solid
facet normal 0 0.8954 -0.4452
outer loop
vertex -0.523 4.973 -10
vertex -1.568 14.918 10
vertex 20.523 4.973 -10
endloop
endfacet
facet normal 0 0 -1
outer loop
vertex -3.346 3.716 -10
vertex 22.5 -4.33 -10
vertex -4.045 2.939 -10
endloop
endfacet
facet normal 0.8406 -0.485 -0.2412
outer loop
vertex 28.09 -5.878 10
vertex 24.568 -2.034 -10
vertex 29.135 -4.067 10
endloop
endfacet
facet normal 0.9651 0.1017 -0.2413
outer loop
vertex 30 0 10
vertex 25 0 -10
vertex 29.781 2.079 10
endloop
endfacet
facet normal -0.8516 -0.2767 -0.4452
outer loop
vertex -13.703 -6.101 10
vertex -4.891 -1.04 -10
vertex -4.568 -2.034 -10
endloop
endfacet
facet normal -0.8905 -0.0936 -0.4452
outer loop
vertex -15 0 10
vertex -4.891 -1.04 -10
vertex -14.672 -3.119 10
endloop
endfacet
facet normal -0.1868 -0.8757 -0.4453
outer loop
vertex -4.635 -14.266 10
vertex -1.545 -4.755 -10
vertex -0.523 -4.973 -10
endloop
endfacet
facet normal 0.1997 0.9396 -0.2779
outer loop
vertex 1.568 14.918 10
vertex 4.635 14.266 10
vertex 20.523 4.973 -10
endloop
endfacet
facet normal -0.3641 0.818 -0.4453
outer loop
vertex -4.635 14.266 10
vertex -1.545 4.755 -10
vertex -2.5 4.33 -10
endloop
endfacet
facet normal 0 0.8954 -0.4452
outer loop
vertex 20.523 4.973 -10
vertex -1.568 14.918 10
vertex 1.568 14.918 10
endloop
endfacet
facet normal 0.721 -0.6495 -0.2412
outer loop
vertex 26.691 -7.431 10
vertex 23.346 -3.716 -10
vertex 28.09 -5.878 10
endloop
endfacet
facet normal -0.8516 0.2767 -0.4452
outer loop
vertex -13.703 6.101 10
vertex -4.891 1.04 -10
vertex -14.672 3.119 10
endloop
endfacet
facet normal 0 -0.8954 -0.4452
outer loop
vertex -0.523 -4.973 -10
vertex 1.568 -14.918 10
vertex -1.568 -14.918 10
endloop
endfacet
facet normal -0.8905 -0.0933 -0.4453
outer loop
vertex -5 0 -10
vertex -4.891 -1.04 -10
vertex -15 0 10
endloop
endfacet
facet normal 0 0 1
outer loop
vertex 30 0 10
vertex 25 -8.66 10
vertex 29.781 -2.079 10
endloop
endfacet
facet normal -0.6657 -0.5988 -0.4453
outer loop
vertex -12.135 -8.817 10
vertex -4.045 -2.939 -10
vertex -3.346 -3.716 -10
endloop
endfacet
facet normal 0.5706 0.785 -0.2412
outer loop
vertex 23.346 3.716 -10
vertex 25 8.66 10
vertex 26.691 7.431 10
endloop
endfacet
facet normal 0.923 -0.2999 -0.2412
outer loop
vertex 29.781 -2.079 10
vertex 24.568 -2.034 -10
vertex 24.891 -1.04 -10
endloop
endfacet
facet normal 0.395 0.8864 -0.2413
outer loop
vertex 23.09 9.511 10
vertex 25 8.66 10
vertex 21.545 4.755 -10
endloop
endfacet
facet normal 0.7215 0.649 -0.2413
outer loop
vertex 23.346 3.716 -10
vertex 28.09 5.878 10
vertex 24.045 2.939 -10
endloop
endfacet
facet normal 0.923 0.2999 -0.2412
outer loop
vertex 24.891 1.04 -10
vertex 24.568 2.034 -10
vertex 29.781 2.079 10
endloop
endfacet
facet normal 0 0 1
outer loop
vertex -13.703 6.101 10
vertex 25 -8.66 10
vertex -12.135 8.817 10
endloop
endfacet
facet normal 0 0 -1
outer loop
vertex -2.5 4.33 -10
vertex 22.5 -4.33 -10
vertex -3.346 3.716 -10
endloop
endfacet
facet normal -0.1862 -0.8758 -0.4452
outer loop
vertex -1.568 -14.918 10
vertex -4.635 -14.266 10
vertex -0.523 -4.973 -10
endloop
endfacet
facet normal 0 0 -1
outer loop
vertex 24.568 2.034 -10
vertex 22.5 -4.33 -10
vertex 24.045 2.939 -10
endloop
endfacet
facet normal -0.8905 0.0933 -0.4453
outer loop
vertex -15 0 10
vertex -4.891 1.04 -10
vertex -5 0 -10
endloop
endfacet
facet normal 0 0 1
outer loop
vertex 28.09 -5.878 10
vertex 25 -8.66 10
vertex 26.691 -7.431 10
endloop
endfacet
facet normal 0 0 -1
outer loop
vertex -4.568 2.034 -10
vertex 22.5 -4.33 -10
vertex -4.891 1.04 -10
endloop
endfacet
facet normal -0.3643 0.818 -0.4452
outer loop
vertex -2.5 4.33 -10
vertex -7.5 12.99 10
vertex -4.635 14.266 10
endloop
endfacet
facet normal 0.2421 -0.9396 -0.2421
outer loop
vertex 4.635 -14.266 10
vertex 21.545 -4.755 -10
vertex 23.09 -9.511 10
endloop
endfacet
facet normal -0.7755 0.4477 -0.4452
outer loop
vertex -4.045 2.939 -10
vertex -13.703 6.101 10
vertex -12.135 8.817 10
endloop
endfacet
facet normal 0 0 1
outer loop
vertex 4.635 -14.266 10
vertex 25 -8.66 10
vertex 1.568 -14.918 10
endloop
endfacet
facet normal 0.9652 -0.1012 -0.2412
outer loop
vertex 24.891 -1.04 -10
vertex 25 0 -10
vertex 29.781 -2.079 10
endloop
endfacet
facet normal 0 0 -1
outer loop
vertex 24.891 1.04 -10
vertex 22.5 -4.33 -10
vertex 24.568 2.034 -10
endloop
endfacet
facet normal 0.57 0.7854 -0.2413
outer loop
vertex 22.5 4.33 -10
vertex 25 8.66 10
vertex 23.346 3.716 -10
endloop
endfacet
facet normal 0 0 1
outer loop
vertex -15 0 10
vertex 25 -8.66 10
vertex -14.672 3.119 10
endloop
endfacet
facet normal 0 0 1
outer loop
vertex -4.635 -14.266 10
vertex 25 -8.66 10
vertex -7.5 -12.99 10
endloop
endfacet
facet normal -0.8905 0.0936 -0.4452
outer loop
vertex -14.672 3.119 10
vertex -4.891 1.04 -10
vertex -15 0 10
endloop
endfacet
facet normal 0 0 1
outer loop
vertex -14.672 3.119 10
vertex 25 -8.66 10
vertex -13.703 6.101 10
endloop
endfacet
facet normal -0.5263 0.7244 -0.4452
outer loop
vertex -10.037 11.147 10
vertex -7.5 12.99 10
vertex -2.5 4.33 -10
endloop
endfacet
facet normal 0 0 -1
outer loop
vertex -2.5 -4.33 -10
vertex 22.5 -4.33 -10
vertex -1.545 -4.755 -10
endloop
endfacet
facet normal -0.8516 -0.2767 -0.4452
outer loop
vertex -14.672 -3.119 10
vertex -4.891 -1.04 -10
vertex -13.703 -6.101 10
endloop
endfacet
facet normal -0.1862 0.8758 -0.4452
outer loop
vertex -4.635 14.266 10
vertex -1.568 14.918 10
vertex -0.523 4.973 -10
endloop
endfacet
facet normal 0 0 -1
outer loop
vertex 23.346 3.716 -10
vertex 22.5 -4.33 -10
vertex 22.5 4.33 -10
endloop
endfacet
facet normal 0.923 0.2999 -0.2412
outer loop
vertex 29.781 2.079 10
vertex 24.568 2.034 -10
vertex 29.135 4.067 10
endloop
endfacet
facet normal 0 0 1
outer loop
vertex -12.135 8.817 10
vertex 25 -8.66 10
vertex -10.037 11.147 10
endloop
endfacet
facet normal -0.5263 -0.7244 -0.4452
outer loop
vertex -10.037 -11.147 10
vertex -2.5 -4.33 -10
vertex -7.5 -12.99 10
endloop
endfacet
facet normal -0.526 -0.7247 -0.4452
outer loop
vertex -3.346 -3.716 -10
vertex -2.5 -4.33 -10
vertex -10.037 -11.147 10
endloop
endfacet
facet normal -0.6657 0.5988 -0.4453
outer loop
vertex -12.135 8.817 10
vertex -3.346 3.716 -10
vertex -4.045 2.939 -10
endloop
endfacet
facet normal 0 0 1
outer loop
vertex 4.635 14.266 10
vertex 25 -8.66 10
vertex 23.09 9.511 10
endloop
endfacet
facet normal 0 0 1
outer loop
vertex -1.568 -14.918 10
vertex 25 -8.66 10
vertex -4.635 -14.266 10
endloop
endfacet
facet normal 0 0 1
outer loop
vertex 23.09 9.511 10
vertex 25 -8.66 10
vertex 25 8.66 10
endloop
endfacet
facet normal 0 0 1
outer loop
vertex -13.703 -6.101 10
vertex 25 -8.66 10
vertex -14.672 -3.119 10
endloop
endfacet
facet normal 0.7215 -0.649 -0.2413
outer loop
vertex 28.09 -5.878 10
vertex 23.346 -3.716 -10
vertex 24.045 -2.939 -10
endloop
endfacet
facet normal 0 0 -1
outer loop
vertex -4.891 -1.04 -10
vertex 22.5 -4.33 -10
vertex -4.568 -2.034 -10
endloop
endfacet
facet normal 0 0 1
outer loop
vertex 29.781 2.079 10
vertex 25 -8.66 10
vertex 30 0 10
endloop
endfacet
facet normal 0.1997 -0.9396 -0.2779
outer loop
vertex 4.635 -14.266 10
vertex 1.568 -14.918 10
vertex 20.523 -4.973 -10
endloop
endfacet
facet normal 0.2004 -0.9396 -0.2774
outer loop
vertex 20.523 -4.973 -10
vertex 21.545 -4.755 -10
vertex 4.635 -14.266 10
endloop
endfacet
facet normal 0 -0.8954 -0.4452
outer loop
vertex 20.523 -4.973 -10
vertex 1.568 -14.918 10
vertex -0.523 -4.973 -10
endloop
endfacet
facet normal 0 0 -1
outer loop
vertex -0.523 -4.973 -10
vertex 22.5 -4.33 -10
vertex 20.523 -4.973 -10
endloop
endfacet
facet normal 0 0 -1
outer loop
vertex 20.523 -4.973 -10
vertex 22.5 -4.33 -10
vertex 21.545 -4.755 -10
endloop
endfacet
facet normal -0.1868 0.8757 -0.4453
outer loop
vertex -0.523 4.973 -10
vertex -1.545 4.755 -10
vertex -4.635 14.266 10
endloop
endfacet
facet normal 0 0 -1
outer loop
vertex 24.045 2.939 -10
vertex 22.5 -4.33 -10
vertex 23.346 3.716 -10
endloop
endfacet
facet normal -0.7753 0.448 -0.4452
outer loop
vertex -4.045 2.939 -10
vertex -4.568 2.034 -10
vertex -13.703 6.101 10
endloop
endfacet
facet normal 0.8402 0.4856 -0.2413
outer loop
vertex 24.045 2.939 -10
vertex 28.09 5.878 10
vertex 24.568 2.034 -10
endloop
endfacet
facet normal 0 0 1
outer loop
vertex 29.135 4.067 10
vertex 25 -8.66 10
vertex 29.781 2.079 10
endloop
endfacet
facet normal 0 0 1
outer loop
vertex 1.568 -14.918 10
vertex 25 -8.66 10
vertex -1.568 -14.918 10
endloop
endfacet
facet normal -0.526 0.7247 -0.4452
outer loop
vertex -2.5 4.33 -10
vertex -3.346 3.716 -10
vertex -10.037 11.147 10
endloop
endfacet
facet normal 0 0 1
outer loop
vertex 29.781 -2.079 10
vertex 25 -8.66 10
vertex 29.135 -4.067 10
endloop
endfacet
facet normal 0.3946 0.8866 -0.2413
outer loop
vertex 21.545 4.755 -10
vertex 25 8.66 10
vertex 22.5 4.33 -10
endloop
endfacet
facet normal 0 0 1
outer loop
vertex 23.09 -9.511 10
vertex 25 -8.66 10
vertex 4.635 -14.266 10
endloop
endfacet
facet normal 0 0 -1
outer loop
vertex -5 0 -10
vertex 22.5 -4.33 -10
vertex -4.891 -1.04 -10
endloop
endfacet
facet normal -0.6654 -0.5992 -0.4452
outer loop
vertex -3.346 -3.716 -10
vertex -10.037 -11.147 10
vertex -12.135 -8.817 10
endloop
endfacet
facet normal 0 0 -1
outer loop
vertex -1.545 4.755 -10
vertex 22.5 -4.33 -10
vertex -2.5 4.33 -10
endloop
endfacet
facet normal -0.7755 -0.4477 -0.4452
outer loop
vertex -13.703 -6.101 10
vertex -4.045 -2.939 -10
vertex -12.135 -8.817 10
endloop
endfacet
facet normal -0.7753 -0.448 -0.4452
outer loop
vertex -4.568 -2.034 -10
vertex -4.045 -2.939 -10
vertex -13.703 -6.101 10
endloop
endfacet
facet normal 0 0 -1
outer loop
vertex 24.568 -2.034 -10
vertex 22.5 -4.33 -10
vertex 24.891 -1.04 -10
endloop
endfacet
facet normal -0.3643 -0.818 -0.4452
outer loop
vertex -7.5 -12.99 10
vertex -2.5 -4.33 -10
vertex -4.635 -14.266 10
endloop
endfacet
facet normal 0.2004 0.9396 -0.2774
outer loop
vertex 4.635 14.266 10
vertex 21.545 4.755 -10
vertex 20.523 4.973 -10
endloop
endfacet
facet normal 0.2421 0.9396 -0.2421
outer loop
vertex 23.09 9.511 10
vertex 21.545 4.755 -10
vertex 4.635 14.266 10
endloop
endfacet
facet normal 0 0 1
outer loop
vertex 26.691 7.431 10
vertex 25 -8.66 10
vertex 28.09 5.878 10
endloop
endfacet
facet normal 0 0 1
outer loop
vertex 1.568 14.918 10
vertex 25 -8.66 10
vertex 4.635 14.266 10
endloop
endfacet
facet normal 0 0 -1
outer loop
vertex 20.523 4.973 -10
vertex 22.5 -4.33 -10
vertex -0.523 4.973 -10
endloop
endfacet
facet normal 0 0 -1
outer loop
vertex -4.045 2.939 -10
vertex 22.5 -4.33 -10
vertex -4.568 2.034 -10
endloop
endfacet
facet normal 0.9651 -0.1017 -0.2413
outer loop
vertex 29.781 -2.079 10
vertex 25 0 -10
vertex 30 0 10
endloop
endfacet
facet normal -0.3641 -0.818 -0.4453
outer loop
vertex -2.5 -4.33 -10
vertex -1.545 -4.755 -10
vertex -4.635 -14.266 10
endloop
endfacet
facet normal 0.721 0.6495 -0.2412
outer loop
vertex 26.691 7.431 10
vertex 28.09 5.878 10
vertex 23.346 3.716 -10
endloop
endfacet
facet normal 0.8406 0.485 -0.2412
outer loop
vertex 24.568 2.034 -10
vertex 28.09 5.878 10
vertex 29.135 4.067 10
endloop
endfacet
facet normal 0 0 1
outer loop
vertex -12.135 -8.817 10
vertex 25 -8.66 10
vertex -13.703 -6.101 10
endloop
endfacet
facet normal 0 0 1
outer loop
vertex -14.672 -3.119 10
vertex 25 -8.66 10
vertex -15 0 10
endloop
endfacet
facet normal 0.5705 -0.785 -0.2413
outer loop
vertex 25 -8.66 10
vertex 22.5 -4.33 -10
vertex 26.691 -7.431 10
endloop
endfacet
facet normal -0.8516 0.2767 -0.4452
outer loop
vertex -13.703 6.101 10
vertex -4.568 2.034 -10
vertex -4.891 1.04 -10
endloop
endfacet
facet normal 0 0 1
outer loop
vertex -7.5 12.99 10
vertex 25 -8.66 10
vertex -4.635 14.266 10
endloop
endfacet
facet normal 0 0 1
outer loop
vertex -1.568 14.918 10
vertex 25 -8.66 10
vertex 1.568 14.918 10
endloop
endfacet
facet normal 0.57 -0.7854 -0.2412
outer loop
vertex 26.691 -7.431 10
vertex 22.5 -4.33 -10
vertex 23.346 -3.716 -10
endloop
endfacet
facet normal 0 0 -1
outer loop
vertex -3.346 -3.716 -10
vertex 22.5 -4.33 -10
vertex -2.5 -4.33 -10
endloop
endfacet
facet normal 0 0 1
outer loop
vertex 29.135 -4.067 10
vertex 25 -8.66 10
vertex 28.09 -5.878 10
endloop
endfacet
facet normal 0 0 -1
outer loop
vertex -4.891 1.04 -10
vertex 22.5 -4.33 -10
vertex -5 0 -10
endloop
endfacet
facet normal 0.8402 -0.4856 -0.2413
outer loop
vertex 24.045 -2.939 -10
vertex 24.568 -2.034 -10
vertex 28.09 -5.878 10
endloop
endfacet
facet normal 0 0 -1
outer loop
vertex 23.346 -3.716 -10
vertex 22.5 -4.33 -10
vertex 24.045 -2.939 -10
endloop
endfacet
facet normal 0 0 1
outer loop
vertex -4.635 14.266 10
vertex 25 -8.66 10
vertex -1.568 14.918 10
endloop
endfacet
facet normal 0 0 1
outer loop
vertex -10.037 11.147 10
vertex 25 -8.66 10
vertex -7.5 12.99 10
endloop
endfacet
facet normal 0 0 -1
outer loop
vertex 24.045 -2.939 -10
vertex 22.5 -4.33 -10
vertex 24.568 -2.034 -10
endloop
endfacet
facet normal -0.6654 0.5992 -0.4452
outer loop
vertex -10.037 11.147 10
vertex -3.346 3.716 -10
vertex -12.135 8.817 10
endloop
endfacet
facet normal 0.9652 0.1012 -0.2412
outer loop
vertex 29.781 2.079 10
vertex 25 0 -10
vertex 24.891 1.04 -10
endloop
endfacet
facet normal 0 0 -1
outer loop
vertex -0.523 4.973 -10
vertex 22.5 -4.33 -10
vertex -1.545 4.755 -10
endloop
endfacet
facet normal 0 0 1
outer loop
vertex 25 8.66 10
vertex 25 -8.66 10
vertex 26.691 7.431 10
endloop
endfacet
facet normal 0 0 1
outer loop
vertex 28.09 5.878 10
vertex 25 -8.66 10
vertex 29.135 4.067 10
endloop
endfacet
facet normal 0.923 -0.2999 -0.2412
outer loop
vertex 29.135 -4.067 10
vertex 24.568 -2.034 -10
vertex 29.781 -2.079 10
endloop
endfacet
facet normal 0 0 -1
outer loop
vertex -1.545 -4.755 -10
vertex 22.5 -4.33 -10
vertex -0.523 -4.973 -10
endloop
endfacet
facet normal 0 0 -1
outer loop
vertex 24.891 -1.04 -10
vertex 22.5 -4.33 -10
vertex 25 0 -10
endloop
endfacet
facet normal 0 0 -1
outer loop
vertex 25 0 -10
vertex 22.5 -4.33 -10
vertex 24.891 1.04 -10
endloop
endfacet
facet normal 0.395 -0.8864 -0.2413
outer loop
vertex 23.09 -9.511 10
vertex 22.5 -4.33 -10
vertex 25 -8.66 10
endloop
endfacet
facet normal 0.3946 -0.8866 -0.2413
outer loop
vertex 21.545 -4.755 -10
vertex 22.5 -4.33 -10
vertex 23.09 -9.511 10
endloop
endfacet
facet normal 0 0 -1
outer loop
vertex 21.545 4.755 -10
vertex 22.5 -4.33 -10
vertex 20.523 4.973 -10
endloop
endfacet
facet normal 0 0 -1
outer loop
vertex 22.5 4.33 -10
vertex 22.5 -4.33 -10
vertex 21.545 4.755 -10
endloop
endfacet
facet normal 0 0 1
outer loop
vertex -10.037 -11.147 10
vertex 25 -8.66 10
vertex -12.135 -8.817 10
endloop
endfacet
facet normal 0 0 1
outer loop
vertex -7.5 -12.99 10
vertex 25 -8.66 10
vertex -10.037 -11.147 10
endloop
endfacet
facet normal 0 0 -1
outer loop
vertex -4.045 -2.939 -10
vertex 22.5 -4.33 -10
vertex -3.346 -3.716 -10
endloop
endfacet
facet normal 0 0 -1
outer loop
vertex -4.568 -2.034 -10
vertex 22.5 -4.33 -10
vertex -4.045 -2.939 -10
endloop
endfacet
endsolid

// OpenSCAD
hull(){cylinder(  20,   5, 15,true);translate([20,0]) cylinder(  20,   5, 10,true);}
